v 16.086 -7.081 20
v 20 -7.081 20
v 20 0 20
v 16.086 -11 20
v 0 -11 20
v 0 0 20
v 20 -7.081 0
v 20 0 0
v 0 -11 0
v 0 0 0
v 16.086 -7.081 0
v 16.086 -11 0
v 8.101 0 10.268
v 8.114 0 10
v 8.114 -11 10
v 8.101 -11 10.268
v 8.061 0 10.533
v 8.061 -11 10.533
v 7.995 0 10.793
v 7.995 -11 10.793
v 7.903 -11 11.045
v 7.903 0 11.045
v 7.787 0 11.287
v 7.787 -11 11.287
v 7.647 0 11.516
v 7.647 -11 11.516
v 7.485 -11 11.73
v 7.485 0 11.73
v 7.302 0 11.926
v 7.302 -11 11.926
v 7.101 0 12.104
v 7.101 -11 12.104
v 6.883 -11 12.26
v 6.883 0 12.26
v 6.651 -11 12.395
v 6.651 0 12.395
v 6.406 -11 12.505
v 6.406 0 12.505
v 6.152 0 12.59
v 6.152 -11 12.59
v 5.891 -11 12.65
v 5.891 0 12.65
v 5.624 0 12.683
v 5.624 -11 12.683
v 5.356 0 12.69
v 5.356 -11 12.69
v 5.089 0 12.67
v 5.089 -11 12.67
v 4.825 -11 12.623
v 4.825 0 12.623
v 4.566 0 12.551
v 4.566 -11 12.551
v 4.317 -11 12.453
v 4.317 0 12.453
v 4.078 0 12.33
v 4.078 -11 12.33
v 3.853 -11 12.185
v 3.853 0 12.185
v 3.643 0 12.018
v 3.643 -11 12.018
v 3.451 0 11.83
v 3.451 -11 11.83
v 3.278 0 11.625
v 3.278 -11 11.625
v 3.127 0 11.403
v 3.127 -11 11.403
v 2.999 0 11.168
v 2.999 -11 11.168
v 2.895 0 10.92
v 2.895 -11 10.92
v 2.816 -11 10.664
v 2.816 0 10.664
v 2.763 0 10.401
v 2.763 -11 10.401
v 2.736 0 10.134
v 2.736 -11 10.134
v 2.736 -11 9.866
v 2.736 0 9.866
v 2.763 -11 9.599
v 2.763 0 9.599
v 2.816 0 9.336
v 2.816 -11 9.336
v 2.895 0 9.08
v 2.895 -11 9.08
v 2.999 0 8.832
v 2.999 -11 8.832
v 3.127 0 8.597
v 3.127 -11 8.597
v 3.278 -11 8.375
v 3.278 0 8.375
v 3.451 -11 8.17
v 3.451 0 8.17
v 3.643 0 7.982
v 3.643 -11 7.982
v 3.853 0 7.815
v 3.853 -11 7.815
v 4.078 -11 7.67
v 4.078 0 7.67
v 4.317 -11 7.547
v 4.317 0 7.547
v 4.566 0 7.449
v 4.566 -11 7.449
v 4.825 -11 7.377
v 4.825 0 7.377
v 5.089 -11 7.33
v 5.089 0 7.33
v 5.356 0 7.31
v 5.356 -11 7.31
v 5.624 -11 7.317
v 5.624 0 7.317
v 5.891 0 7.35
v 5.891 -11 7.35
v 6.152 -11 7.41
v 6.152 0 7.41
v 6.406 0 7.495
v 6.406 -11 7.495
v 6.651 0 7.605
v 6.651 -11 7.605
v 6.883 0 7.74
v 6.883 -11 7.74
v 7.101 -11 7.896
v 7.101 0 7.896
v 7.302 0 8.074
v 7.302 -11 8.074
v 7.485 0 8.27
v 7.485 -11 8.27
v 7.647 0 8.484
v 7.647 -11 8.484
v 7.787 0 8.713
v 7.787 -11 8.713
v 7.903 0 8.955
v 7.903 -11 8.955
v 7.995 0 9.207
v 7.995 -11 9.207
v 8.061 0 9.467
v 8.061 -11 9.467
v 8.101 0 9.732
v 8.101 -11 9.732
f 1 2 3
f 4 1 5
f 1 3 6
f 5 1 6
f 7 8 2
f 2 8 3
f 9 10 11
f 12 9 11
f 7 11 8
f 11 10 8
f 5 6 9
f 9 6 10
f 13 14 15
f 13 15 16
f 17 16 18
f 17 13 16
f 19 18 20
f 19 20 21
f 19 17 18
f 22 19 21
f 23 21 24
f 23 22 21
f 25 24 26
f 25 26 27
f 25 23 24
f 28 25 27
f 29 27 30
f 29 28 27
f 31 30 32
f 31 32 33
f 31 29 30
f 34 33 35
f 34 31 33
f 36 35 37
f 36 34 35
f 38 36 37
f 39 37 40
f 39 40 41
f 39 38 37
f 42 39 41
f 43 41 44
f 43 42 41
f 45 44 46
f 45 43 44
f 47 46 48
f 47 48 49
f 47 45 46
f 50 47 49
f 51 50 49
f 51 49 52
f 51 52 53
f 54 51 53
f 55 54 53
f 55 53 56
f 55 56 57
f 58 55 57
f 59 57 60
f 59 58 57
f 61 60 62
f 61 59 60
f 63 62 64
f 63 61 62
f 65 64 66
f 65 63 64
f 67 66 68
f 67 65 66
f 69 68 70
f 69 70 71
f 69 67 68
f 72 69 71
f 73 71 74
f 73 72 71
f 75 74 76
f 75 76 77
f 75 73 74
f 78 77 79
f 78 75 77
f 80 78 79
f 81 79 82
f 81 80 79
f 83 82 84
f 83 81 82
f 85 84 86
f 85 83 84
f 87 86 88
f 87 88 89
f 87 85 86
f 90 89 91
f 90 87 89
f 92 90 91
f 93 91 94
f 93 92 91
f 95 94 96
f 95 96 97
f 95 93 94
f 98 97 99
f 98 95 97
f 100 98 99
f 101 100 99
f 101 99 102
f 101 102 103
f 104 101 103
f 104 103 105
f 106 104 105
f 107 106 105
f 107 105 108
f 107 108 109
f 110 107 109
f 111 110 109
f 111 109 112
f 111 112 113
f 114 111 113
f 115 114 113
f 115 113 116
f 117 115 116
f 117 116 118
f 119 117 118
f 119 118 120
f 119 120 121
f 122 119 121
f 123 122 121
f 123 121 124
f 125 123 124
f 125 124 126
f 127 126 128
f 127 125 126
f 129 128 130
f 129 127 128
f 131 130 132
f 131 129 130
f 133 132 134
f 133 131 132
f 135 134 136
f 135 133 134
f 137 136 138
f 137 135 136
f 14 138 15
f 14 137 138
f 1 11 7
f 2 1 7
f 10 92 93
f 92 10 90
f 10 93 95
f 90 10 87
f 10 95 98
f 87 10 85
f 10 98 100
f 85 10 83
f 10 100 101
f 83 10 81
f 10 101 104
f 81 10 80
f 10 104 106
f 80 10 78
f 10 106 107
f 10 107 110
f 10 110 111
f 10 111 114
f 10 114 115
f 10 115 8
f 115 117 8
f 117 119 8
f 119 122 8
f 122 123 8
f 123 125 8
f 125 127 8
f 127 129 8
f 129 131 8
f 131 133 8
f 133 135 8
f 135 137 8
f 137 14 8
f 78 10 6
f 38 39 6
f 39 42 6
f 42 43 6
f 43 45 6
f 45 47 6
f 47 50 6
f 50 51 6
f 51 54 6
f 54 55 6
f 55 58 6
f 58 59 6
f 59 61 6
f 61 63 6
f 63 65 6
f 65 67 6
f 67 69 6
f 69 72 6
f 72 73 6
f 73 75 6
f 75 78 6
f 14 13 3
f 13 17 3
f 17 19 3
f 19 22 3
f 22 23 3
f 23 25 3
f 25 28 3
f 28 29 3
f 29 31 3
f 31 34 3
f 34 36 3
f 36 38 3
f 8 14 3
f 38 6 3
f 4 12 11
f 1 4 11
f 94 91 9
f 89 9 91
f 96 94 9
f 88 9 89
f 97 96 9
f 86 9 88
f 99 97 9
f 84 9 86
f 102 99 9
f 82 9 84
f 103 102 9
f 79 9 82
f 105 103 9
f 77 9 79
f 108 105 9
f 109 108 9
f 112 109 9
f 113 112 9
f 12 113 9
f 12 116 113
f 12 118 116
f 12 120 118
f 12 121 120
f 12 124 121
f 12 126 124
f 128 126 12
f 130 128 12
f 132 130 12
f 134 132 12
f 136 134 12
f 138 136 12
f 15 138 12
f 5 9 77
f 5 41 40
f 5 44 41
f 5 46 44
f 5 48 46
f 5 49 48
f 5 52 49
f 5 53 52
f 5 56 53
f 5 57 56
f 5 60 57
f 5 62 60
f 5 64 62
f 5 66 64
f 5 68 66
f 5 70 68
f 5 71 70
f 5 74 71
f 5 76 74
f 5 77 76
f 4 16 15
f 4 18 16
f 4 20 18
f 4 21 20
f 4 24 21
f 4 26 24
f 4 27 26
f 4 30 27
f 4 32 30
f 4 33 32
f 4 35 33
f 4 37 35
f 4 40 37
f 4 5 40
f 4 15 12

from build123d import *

# Parameters (mm, degrees)
F0_R      = 2.690874
F1_DEPTH  = 11
F2_W      = 4
F2_H      = 4
F1_FACE_W = 20
F1_FACE_H = 11
F3_DEPTH  = 25


with BuildPart() as f1:
    # F0 (on Front) → F1 (new body)
    with BuildSketch(Plane.XZ):
        Polygon((0, 10), (0, 0), (20, 0), (20, 20), (0, 20), align=None)
        with Locations((5.423373, 10)):
            Circle(F0_R, mode=Mode.SUBTRACT)
    extrude(amount=F1_DEPTH)

    # F2 (on Top) + F1_face (on face) → F3 (cut)
    with BuildSketch(Plane.XY):
        with Locations((18.086078, -9.081113)):
            Rectangle(F2_W, F2_H)
    with BuildSketch(Plane(origin=(10, -5.5, 20), x_dir=(1, 0, 0), z_dir=(0, 0, 1))):
        Rectangle(F1_FACE_W, F1_FACE_H)
    extrude(amount=F3_DEPTH, mode=Mode.SUBTRACT)


solid = f1.part
